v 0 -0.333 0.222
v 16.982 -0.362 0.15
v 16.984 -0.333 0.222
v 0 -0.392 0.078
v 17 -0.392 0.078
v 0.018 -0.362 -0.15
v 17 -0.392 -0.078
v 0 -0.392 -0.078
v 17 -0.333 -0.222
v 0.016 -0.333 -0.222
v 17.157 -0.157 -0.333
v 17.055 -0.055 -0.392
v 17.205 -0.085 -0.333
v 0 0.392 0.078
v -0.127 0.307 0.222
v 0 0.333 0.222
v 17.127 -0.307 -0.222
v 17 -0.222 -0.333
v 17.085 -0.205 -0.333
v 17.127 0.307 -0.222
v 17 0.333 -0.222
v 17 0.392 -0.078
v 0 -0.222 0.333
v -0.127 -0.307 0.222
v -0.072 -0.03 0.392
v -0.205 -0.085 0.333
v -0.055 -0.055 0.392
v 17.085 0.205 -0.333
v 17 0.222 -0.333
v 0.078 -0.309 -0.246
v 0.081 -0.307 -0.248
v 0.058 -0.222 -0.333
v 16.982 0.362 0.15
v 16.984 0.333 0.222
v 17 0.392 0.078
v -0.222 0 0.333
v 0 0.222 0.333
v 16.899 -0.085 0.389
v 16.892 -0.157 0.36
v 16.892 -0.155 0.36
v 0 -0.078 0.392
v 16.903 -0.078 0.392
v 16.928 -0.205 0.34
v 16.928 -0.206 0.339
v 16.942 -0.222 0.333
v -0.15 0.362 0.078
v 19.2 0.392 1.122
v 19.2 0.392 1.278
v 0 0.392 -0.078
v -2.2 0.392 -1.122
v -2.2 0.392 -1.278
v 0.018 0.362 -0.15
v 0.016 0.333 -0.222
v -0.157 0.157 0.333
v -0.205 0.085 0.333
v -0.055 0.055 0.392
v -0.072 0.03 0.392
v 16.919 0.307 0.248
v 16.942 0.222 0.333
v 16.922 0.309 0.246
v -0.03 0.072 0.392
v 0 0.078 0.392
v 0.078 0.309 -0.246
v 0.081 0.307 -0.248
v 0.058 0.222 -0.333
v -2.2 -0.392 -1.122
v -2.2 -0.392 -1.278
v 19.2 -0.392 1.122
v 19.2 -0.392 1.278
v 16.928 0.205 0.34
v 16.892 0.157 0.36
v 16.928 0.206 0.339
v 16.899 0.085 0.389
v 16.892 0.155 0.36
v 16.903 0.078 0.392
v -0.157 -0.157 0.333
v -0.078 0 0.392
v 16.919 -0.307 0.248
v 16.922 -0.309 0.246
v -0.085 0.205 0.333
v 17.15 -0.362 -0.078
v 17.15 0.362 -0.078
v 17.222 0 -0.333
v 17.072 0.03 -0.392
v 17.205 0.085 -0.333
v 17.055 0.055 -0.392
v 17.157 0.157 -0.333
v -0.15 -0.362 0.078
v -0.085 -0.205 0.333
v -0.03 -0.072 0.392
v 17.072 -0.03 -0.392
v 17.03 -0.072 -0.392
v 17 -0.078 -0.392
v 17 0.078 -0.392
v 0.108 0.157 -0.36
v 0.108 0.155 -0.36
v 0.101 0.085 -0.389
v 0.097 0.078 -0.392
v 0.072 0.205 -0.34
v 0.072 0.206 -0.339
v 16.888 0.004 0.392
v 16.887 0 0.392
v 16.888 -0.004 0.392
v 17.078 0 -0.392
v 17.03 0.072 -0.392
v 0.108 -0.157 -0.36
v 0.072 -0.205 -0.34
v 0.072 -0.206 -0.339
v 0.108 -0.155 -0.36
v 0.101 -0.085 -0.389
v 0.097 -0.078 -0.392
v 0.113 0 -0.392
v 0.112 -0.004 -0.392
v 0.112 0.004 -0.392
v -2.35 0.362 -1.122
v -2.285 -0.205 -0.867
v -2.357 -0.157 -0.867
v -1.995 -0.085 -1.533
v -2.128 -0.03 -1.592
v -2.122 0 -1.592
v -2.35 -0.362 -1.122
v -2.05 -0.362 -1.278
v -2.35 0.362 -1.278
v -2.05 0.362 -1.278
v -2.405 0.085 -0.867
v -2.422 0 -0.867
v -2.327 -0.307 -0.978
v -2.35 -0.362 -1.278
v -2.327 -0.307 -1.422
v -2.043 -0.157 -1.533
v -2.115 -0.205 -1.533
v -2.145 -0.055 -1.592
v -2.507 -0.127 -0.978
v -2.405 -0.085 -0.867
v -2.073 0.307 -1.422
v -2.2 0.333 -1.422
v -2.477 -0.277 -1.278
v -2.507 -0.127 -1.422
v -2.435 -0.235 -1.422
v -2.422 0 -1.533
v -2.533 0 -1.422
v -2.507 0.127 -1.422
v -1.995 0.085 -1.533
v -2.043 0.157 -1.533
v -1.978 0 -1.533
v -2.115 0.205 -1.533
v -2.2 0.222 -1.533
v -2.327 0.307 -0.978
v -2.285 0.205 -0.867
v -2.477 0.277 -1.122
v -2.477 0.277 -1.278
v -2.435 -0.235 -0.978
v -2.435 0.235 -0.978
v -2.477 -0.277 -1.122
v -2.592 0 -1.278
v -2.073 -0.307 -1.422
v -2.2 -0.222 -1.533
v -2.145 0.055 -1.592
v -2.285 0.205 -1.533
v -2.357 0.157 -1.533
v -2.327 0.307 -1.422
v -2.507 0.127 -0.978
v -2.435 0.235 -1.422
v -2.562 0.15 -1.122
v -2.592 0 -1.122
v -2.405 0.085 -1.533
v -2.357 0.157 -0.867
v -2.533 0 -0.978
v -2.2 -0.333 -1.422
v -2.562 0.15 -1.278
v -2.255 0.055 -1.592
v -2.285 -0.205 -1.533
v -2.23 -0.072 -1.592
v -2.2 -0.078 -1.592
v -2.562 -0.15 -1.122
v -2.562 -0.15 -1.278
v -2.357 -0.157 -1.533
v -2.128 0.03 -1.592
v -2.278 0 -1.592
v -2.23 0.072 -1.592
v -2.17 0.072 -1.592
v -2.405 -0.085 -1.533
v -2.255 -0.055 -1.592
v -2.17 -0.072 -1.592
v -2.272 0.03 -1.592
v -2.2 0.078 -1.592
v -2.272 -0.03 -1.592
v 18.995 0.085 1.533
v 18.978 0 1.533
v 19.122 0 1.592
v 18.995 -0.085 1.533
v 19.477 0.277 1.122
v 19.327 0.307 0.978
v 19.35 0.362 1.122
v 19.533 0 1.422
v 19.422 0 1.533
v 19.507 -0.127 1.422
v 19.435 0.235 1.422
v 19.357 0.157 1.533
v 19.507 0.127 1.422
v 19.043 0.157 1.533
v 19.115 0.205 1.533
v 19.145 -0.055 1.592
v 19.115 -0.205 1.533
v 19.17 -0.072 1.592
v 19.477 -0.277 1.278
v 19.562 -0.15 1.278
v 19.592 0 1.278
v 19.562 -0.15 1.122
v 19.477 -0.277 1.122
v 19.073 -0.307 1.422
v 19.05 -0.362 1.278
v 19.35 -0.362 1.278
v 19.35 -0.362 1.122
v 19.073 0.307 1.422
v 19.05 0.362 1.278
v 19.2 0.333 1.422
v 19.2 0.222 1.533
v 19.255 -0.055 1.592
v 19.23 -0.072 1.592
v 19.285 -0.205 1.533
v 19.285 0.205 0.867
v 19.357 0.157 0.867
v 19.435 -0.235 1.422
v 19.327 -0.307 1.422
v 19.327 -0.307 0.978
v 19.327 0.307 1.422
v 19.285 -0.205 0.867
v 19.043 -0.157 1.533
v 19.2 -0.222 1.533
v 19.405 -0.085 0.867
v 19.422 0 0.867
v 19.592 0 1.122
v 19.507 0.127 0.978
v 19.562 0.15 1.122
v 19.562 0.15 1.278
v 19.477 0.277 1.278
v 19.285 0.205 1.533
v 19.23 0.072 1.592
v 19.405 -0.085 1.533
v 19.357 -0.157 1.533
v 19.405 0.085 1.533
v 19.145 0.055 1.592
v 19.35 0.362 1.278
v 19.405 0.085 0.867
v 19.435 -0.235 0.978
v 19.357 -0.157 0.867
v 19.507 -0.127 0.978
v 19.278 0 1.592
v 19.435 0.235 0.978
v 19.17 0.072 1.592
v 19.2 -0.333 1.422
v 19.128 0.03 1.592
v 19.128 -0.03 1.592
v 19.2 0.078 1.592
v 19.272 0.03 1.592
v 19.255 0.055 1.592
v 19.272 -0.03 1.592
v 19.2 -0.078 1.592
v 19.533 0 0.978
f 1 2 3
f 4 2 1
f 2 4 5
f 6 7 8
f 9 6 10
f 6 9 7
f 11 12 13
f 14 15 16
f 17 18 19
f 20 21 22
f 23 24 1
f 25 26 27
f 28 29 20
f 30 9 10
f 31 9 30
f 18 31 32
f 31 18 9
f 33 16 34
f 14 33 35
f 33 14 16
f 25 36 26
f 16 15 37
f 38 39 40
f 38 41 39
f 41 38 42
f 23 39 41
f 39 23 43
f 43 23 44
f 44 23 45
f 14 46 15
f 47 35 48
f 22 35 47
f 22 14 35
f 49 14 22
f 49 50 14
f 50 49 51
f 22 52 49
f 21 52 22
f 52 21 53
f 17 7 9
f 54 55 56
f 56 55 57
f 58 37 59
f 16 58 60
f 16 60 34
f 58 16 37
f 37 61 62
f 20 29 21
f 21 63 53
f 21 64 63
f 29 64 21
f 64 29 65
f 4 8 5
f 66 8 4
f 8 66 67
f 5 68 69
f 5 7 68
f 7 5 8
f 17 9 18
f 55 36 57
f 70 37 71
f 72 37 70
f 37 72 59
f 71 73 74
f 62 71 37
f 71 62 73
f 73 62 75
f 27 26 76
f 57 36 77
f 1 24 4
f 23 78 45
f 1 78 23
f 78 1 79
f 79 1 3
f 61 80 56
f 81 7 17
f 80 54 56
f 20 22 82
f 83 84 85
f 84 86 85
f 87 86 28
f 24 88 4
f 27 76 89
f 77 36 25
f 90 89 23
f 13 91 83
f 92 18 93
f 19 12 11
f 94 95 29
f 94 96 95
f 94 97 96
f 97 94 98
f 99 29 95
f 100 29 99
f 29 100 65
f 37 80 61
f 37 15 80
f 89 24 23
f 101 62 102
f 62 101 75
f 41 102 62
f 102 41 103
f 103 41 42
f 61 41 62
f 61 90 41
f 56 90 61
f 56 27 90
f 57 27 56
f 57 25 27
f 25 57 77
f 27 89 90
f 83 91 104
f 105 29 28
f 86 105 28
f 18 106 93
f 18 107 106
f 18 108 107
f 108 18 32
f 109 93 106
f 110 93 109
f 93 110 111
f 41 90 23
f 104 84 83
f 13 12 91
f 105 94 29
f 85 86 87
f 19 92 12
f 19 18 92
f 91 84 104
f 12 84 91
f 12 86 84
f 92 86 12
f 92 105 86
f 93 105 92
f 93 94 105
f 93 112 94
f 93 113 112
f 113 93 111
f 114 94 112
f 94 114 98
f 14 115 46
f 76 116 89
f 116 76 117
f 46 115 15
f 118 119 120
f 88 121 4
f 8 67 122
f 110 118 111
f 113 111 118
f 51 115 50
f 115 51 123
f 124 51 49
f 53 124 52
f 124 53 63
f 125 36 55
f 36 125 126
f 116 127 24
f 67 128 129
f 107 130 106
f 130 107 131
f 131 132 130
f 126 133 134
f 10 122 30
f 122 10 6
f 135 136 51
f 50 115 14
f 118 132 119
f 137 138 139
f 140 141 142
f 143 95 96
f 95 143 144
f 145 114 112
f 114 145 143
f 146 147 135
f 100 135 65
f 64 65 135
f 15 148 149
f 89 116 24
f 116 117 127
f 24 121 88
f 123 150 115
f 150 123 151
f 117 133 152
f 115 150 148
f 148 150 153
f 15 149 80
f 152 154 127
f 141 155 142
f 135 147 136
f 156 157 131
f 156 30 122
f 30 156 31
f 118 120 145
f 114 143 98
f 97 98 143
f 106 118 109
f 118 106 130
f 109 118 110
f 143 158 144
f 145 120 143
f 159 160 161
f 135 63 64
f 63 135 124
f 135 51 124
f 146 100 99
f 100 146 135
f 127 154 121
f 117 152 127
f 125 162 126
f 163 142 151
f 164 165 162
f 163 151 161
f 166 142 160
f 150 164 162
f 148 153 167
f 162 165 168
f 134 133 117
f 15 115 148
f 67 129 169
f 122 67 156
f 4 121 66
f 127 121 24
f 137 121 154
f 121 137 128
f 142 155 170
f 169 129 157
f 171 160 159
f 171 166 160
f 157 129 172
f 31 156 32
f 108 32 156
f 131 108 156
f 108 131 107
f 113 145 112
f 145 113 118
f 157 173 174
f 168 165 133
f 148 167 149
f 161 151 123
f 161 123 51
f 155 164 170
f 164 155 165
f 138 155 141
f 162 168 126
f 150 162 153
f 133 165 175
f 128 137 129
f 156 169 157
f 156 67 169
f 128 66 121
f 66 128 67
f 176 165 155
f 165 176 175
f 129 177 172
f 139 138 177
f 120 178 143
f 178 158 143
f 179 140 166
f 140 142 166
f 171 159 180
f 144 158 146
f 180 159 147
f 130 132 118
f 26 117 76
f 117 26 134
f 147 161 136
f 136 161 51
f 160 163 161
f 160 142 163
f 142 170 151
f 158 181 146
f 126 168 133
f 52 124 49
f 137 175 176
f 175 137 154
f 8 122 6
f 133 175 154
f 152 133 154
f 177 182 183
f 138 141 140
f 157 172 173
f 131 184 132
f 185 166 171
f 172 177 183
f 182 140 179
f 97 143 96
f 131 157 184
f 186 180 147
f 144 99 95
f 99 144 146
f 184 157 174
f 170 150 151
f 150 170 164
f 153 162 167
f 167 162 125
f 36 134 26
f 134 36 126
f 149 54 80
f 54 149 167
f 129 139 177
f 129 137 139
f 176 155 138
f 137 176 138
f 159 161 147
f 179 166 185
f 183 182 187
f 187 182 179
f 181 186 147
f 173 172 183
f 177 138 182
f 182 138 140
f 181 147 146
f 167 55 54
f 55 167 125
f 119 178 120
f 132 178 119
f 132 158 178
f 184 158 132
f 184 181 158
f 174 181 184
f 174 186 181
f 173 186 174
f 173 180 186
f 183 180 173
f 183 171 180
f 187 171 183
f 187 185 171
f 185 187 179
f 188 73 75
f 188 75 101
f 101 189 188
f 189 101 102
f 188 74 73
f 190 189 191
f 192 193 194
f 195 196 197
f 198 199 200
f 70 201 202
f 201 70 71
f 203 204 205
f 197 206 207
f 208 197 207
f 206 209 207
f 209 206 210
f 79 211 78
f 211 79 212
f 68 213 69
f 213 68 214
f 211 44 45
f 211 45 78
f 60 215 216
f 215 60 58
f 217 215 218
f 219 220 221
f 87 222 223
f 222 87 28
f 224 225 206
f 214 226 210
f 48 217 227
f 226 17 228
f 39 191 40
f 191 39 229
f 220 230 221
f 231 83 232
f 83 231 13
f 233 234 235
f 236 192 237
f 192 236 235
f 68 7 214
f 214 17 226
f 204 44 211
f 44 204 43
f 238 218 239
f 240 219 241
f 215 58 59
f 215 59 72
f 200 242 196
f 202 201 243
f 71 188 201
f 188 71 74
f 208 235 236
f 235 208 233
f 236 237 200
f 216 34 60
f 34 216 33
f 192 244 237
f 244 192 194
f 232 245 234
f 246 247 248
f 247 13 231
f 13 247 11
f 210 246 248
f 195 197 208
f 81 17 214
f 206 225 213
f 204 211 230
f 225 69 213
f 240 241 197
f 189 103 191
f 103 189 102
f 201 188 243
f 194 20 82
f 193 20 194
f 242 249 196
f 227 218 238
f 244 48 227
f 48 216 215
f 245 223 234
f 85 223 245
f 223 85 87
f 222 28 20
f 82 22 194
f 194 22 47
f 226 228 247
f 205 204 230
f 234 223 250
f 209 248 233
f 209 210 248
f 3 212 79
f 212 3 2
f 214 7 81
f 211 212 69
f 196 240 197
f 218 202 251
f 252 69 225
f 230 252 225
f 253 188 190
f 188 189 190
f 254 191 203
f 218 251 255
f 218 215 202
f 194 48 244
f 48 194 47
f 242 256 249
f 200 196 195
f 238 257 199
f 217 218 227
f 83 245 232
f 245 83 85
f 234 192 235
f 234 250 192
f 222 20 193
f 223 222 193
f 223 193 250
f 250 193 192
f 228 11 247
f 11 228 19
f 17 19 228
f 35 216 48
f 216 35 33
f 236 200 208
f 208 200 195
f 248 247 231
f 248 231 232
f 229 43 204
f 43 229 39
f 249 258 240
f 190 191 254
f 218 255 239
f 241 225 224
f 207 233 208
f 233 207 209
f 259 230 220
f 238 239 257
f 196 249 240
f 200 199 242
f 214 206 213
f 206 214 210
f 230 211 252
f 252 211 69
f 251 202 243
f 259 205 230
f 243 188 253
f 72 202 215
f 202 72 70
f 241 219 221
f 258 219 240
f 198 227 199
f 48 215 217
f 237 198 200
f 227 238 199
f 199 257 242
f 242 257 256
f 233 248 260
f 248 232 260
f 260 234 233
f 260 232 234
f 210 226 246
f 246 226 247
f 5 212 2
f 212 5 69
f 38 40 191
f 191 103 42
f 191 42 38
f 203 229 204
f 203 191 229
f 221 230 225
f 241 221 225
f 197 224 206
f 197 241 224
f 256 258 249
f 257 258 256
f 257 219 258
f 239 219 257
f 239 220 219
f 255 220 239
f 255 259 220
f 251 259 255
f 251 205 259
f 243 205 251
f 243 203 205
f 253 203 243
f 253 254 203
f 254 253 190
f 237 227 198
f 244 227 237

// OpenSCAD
// part_id: b15
// name: B15 wire link
// source_drawing_ids: DRW-002
// units: mm
// revision: 0.1
// SPDX-License-Identifier: MIT

module wire_segment(a = [0, 0, 0], b = [10, 0, 0], d = 0.8) {
    hull() {
        translate(a) sphere(d = d, $fn = 16);
        translate(b) sphere(d = d, $fn = 16);
    }
}

module part_b15(run = 17, drop = 4, wire_d = 0.8) {
    // Bent wire with short return hooks at ends.
    union() {
        wire_segment([0, 0, 0], [run, 0, 0], wire_d);
        wire_segment([0, 0, 0], [-2.2, 0, -1.2], wire_d);
        wire_segment([run, 0, 0], [run + 2.2, 0, 1.2], wire_d);
    }
}

// ---- "main guard" ----
// Default to previewing when opened directly:
if (is_undef(__LIB_MODE__)) {
    part_b15();
}
